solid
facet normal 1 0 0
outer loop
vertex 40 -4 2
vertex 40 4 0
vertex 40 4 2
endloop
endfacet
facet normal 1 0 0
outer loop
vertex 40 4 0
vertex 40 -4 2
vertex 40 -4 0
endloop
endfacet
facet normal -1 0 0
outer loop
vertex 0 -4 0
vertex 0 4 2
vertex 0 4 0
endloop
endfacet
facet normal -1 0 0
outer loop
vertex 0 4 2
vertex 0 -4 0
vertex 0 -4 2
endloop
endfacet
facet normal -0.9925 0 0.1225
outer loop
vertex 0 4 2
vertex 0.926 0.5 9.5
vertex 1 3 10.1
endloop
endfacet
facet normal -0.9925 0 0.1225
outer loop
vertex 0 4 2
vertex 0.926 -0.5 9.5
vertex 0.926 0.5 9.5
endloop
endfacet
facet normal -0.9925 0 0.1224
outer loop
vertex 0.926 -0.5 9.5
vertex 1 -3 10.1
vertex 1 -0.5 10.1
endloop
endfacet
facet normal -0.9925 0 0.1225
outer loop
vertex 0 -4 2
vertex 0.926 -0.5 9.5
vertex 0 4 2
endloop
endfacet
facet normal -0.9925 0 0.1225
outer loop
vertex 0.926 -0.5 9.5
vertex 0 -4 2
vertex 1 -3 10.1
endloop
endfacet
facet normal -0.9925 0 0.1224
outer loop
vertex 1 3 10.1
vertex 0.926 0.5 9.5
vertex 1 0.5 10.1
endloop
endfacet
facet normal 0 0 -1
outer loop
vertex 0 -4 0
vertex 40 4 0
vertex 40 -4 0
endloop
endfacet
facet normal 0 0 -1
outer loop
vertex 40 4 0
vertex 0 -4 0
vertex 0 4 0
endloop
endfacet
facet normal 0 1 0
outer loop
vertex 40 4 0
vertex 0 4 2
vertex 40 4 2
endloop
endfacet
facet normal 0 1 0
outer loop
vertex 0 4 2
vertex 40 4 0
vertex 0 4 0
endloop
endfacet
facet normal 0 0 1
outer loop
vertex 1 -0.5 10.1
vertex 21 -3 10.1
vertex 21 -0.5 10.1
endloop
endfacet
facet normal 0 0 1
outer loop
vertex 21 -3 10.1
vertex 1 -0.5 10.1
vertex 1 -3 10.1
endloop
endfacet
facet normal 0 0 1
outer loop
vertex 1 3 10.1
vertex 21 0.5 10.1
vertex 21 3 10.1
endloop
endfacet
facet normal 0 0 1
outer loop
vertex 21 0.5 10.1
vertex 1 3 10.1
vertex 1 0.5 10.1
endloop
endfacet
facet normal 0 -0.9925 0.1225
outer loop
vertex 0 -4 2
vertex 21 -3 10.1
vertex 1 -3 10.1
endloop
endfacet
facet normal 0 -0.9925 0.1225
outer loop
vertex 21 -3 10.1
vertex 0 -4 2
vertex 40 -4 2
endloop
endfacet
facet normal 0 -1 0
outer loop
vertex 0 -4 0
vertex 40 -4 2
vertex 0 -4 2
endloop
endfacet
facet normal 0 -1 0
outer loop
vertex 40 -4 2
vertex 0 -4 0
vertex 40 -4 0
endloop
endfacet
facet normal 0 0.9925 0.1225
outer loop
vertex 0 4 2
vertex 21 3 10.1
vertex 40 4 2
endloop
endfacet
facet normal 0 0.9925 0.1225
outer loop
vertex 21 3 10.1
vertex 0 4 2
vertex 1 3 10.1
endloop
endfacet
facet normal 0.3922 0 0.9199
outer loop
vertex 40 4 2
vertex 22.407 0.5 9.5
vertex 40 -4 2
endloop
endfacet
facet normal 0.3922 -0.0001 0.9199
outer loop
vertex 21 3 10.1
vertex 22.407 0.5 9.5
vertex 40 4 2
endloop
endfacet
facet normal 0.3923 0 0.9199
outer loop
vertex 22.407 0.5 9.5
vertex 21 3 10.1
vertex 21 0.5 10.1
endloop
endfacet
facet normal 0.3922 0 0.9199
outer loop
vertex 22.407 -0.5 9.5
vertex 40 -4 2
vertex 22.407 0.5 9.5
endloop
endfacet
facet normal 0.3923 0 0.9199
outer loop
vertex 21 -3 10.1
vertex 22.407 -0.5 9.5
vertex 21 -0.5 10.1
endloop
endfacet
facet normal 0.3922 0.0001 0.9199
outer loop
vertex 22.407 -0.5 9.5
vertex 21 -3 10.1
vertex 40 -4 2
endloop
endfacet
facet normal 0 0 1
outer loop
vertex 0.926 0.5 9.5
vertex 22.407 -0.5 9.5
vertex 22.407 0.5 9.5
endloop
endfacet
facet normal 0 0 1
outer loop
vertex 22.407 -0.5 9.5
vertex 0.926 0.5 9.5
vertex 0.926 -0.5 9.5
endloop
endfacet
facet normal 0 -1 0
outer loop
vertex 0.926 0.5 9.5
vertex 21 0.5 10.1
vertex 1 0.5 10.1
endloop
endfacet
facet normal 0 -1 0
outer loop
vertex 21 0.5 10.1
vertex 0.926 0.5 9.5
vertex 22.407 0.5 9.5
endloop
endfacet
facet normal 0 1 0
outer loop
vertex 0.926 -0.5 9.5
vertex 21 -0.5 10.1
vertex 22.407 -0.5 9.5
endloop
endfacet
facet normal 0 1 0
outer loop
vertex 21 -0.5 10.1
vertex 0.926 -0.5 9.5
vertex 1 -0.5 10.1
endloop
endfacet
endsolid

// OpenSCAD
include <config.scad>


$fs=$fs/2;
$fa=$fa/2;

h = 10;

difference(){
    hull(){
        translate([0, -4, 0])cube([40, 8, 2]);
        translate([1, -3, h])cube([20, 6, 0.1]);
    }
    translate([1, 0, h])cube([50, 1, 1],center = true);
}
    
